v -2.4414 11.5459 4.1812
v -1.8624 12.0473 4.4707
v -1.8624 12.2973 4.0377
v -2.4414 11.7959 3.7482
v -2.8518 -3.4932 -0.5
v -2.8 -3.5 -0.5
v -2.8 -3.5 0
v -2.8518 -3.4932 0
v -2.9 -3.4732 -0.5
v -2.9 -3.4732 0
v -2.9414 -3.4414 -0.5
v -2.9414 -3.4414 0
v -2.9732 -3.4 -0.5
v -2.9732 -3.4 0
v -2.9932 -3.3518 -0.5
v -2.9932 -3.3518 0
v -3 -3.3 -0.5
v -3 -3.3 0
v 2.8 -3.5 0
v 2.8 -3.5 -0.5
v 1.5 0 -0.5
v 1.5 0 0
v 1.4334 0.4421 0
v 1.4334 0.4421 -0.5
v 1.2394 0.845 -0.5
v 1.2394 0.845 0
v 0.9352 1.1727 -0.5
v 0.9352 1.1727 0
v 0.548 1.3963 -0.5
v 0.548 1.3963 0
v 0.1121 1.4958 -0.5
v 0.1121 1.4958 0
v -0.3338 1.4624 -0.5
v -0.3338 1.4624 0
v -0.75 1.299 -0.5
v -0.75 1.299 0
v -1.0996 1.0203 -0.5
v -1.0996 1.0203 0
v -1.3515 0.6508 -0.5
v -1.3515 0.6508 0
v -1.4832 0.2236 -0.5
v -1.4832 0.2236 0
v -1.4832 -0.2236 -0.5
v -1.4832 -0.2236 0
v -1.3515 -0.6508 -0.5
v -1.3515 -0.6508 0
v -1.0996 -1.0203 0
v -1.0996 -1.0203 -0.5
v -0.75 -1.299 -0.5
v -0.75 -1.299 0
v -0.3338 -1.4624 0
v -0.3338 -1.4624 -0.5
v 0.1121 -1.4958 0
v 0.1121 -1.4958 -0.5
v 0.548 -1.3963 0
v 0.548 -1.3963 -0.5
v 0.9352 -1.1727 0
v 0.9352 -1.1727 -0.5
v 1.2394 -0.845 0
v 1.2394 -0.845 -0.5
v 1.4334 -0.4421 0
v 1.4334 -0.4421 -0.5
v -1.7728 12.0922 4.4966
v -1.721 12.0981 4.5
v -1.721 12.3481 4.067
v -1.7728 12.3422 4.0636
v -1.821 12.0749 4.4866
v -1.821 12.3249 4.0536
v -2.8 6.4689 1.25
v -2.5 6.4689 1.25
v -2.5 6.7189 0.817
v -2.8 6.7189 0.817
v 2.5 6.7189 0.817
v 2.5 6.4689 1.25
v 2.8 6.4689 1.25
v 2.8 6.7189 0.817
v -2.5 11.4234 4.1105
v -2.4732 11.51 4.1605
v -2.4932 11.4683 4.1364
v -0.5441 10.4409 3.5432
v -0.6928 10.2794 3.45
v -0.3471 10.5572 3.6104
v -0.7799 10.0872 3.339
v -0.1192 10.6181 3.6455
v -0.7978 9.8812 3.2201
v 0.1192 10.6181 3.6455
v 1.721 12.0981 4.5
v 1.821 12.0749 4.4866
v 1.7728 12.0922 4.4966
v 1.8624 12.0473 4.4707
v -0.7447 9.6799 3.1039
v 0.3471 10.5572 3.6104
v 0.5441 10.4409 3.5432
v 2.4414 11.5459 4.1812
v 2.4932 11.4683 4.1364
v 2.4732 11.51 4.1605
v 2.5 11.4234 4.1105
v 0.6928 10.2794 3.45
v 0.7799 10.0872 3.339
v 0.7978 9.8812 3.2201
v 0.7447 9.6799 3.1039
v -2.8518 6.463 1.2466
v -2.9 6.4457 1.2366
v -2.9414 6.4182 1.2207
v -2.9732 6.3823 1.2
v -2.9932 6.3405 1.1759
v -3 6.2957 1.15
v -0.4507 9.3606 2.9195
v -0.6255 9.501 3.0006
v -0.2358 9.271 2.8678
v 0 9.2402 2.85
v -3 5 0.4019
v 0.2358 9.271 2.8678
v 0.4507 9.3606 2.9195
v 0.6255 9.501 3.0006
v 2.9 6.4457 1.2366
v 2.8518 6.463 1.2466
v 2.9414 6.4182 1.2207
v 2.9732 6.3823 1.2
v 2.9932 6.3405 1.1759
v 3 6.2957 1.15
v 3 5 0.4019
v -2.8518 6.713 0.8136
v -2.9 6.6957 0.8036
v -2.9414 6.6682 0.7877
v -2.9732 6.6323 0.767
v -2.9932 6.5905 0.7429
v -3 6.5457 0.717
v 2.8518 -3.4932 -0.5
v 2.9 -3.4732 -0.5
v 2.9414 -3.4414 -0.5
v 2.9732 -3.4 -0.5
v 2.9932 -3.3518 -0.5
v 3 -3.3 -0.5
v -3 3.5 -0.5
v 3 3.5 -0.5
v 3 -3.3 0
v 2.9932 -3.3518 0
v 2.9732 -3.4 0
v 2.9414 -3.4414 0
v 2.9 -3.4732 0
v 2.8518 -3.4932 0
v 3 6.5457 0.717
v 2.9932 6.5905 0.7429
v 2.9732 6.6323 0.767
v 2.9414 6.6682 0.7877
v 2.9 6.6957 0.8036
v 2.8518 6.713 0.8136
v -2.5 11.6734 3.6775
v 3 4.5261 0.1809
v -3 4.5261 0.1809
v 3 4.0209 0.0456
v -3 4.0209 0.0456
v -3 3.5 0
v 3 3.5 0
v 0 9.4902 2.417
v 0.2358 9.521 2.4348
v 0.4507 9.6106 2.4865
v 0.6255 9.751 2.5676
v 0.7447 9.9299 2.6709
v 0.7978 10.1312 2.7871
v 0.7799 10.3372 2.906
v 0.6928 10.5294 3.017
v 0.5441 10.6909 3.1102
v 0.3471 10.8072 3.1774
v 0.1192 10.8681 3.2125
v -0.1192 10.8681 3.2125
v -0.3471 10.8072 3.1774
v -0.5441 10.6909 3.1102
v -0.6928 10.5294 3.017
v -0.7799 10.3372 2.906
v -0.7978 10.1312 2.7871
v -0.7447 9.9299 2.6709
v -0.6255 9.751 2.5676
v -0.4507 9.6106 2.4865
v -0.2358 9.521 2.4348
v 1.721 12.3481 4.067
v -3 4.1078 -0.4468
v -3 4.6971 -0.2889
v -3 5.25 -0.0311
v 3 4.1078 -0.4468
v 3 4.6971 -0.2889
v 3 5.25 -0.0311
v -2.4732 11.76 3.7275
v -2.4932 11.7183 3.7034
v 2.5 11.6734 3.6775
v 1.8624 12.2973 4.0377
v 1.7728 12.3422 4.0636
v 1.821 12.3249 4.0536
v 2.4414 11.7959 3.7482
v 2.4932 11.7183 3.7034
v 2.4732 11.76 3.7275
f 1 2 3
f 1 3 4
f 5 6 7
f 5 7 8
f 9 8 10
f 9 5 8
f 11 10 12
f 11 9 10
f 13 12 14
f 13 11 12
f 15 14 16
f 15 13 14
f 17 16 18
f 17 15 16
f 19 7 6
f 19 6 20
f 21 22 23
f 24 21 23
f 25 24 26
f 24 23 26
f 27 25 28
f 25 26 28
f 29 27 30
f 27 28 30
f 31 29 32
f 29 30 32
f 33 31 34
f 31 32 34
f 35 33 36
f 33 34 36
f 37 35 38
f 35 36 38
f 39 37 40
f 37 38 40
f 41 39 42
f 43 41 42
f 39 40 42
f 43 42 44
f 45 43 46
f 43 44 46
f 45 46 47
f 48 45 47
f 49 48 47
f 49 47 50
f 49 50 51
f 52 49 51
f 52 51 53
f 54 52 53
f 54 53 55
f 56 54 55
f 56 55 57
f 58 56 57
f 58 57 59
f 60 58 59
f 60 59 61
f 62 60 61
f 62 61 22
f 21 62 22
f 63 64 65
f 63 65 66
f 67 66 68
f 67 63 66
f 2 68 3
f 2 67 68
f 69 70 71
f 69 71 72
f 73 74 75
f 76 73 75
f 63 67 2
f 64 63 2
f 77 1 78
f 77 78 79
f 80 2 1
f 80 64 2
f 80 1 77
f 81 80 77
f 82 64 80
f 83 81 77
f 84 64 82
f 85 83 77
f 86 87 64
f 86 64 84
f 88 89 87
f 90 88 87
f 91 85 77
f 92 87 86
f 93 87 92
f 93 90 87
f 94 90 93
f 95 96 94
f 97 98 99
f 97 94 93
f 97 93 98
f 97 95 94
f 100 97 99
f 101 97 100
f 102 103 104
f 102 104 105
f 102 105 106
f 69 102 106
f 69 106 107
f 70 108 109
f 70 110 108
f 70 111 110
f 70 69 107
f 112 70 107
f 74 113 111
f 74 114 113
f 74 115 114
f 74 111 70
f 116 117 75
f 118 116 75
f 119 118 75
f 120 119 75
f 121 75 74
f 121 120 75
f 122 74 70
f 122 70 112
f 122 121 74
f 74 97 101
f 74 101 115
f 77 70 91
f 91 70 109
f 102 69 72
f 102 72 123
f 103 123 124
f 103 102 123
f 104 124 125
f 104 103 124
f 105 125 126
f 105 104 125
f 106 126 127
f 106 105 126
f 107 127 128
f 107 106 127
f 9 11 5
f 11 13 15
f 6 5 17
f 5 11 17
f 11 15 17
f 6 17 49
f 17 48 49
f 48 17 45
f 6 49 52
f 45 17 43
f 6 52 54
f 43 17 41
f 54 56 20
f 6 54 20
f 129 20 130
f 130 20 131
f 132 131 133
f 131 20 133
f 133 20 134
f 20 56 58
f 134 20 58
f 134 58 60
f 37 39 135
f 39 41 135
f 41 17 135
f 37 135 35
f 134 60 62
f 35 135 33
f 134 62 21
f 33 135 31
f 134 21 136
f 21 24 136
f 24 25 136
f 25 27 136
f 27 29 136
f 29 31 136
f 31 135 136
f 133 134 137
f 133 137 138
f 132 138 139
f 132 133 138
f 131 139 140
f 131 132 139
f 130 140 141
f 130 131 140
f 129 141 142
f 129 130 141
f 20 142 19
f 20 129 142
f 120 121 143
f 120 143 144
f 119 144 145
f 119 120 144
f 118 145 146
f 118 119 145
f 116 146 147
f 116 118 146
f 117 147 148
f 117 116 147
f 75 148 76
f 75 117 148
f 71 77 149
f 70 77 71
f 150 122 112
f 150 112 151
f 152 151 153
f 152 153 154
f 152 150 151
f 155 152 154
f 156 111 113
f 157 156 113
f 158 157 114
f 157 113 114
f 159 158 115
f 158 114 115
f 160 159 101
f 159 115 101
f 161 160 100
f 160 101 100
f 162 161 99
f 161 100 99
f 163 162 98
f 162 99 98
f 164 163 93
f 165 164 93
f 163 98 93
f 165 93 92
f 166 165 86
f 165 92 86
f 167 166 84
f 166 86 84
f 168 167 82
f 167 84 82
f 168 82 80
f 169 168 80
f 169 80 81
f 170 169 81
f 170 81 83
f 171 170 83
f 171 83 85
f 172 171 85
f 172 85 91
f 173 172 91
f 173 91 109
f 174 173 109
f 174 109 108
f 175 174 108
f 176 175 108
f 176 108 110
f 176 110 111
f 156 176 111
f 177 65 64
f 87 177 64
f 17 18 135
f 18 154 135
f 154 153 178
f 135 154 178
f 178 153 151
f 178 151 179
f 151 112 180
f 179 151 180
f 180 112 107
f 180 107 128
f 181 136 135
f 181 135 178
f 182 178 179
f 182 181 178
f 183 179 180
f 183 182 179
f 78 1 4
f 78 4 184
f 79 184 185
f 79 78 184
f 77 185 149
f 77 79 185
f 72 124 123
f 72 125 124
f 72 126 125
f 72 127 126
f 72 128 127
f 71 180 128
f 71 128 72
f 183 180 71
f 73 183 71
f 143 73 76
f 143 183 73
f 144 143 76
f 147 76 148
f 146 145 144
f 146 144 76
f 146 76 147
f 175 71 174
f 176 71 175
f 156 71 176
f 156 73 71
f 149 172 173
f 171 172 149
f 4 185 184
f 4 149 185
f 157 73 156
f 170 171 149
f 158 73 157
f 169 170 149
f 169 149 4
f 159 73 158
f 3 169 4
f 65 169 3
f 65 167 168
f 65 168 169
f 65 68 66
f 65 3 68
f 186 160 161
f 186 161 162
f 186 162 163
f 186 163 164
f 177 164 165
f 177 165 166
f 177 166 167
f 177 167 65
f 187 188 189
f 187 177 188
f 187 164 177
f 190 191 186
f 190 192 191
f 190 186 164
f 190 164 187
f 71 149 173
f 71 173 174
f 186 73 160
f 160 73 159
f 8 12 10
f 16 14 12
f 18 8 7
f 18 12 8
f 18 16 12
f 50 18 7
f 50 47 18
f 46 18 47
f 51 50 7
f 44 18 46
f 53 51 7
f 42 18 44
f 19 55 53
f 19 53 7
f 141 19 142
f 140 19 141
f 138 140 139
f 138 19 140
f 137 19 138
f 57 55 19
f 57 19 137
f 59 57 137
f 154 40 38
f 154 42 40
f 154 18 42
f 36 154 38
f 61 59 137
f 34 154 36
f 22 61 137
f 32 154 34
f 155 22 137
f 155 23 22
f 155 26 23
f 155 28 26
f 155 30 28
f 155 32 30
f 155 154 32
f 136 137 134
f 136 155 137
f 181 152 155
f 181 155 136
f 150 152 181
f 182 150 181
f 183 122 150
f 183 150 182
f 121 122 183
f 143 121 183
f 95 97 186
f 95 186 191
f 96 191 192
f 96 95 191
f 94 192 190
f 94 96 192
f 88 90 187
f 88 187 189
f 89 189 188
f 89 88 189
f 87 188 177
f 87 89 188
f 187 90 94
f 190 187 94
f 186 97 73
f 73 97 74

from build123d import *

# Parameters (mm, degrees)
SKETCH_1_W             = 6
SKETCH_1_H             = 7
SM_BASE_FLANGE_1_DEPTH = 0.5
SM_EDGE_FLANGE_1_DEPTH = 6
SKETCH_11_R            = 1.5
CUT_EXTRUDE_1_DEPTH    = 14.480541017
CUT_EXTRUDE_2_REACH    = 15.287
SKETCH_12_R            = 0.8
OTHER_START            = 2.151923789
OTHER_1_DEPTH          = 0.5
OTHER_START_2          = -0.5
OTHER_1_2_DEPTH        = 0.5


# Read off the part's stored shape, not the designer's step: Затупленный угол1
# Sheet-metal steps are written as plain solids
with BuildPart() as part:
    # Sketch 1 → Базовая кромка1 (new body)
    with BuildSketch(Plane.XY):
        Rectangle(SKETCH_1_W, SKETCH_1_H)
    extrude(amount=-SM_BASE_FLANGE_1_DEPTH)

    # Ребро-кромка1 section (across the edge) → Ребро-кромка1 (add)
    with BuildSketch(Plane(origin=(3, 4.303847577, 0), x_dir=(0, -0.49999999999999495, 0.8660254037844416), z_dir=(-1, 0, 0))):
        with BuildLine():
            Line((-0.5, 0.803847577), (-0.5, 9))
            Line((-0.5, 9), (0, 9))
            Line((0, 9), (0, 0.803847577))
            ThreePointArc((0, 0.803847577), (0.102222521, 0.027390442), (0.401923789, -0.696152423))
            Line((0.401923789, -0.696152423), (-0.031088913, -0.946152423))
            ThreePointArc((-0.031088913, -0.946152423), (-0.380740392, -0.102019081), (-0.5, 0.803847577))
        make_face()
    extrude(amount=SM_EDGE_FLANGE_1_DEPTH)

    # Эскиз11 → Вырез-Вытянуть1 (cut, through all)
    with BuildSketch(Plane.XY):
        Circle(SKETCH_11_R)
    extrude(amount=-CUT_EXTRUDE_1_DEPTH, mode=Mode.SUBTRACT)

    # Эскиз12 → Вырез-Вытянуть2 (cut, up to next)
    with BuildSketch(Plane(origin=(0, 1.075961894, -1.863620668), x_dir=(1, 0, 0), z_dir=(0, -0.4999999999999949, 0.8660254037844416)), mode=Mode.PRIVATE) as cut_extrude_2_sk1:
        with Locations(Location((0, 10.227241336, 0), (0, 0, 270))):
            Circle(SKETCH_12_R)
    cut_extrude_2_tool1 = extrude(cut_extrude_2_sk1.sketch, amount=-CUT_EXTRUDE_2_REACH, mode=Mode.PRIVATE) & part.part
    # Эскиз12 → Вырез-Вытянуть2 (cut, up to next)
    with BuildSketch(Plane(origin=(0, 1.075961894, -1.863620668), x_dir=(1, 0, 0), z_dir=(0, -0.4999999999999949, 0.8660254037844416)), mode=Mode.PRIVATE) as cut_extrude_2_sk2:
        Polygon((-1.803847577, 12.727241336), (-2.5, 12.031088913), (-2.5, 6.227241336), (-3, 6.227241336), (-3, 12.727241336), align=None)
    cut_extrude_2_tool2 = extrude(cut_extrude_2_sk2.sketch, amount=-CUT_EXTRUDE_2_REACH, mode=Mode.PRIVATE) & part.part
    # Эскиз12 → Вырез-Вытянуть2 (cut, up to next)
    with BuildSketch(Plane(origin=(0, 1.075961894, -1.863620668), x_dir=(1, 0, 0), z_dir=(0, -0.4999999999999949, 0.8660254037844416)), mode=Mode.PRIVATE) as cut_extrude_2_sk3:
        Polygon((3, 12.727241336), (1.803847577, 12.727241336), (2.5, 12.031088913), (2.5, 6.227241336), (3, 6.227241336), align=None)
    cut_extrude_2_tool3 = extrude(cut_extrude_2_sk3.sketch, amount=-CUT_EXTRUDE_2_REACH, mode=Mode.PRIVATE) & part.part
    add(cut_extrude_2_tool1.solids().sort_by_distance((0, 9.933013, 3.25))[0], mode=Mode.SUBTRACT)
    add(cut_extrude_2_tool2.solids().sort_by_distance((-2.716553, 9.46484, 2.9797))[0], mode=Mode.SUBTRACT)
    add(cut_extrude_2_tool3.solids().sort_by_distance((2.716553, 9.46484, 2.9797))[0], mode=Mode.SUBTRACT)

    # Other 1 outline → Other 1 (cut)
    with BuildSketch(Plane(origin=(0, 0, 0), x_dir=(1, 0, 0), z_dir=(0, 0.4999999999999948, -0.8660254037844417)).offset(OTHER_START)):
        with BuildLine():
            Line((-3, -6.227241336), (-2.8, -6.227241336))
            ThreePointArc((-2.8, -6.227241336), (-2.941421356, -6.168662692), (-3, -6.027241336))
            Line((-3, -6.027241336), (-3, -6.227241336))
        make_face()
        with BuildLine():
            Line((-2.5, -12.031088913), (-2.441421356, -12.089667557))
            ThreePointArc((-2.441421356, -12.089667557), (-2.484775907, -12.024782888), (-2.5, -11.948246201))
            Line((-2.5, -11.948246201), (-2.5, -12.031088913))
        make_face()
        with BuildLine():
            Line((-1.803847577, -12.727241336), (-1.721004865, -12.727241336))
            ThreePointArc((-1.721004865, -12.727241336), (-1.797541551, -12.712017242), (-1.862426221, -12.668662692))
            Line((-1.862426221, -12.668662692), (-1.803847577, -12.727241336))
        make_face()
        with BuildLine():
            Line((1.803847577, -12.727241336), (1.862426221, -12.668662692))
            ThreePointArc((1.862426221, -12.668662692), (1.797541551, -12.712017242), (1.721004865, -12.727241336))
            Line((1.721004865, -12.727241336), (1.803847577, -12.727241336))
        make_face()
        with BuildLine():
            Line((2.5, -12.031088913), (2.5, -11.948246201))
            ThreePointArc((2.5, -11.948246201), (2.484775907, -12.024782888), (2.441421356, -12.089667557))
            Line((2.441421356, -12.089667557), (2.5, -12.031088913))
        make_face()
        with BuildLine():
            ThreePointArc((3, -6.027241336), (2.941421356, -6.168662692), (2.8, -6.227241336))
            Line((2.8, -6.227241336), (3, -6.227241336))
            Line((3, -6.227241336), (3, -6.027241336))
        make_face()
    extrude(amount=OTHER_1_DEPTH, mode=Mode.SUBTRACT)

    # Other 1 2 outline → Other 1 2 (cut)
    with BuildSketch(Plane.XY.offset(OTHER_START_2)):
        with BuildLine():
            ThreePointArc((3, -3.3), (2.941421356, -3.441421356), (2.8, -3.5))
            Line((2.8, -3.5), (3, -3.5))
            Line((3, -3.5), (3, -3.3))
        make_face()
        with BuildLine():
            ThreePointArc((-2.8, -3.5), (-2.941421356, -3.441421356), (-3, -3.3))
            Line((-3, -3.3), (-3, -3.5))
            Line((-3, -3.5), (-2.8, -3.5))
        make_face()
    extrude(amount=OTHER_1_2_DEPTH, mode=Mode.SUBTRACT)


solid = part.part
